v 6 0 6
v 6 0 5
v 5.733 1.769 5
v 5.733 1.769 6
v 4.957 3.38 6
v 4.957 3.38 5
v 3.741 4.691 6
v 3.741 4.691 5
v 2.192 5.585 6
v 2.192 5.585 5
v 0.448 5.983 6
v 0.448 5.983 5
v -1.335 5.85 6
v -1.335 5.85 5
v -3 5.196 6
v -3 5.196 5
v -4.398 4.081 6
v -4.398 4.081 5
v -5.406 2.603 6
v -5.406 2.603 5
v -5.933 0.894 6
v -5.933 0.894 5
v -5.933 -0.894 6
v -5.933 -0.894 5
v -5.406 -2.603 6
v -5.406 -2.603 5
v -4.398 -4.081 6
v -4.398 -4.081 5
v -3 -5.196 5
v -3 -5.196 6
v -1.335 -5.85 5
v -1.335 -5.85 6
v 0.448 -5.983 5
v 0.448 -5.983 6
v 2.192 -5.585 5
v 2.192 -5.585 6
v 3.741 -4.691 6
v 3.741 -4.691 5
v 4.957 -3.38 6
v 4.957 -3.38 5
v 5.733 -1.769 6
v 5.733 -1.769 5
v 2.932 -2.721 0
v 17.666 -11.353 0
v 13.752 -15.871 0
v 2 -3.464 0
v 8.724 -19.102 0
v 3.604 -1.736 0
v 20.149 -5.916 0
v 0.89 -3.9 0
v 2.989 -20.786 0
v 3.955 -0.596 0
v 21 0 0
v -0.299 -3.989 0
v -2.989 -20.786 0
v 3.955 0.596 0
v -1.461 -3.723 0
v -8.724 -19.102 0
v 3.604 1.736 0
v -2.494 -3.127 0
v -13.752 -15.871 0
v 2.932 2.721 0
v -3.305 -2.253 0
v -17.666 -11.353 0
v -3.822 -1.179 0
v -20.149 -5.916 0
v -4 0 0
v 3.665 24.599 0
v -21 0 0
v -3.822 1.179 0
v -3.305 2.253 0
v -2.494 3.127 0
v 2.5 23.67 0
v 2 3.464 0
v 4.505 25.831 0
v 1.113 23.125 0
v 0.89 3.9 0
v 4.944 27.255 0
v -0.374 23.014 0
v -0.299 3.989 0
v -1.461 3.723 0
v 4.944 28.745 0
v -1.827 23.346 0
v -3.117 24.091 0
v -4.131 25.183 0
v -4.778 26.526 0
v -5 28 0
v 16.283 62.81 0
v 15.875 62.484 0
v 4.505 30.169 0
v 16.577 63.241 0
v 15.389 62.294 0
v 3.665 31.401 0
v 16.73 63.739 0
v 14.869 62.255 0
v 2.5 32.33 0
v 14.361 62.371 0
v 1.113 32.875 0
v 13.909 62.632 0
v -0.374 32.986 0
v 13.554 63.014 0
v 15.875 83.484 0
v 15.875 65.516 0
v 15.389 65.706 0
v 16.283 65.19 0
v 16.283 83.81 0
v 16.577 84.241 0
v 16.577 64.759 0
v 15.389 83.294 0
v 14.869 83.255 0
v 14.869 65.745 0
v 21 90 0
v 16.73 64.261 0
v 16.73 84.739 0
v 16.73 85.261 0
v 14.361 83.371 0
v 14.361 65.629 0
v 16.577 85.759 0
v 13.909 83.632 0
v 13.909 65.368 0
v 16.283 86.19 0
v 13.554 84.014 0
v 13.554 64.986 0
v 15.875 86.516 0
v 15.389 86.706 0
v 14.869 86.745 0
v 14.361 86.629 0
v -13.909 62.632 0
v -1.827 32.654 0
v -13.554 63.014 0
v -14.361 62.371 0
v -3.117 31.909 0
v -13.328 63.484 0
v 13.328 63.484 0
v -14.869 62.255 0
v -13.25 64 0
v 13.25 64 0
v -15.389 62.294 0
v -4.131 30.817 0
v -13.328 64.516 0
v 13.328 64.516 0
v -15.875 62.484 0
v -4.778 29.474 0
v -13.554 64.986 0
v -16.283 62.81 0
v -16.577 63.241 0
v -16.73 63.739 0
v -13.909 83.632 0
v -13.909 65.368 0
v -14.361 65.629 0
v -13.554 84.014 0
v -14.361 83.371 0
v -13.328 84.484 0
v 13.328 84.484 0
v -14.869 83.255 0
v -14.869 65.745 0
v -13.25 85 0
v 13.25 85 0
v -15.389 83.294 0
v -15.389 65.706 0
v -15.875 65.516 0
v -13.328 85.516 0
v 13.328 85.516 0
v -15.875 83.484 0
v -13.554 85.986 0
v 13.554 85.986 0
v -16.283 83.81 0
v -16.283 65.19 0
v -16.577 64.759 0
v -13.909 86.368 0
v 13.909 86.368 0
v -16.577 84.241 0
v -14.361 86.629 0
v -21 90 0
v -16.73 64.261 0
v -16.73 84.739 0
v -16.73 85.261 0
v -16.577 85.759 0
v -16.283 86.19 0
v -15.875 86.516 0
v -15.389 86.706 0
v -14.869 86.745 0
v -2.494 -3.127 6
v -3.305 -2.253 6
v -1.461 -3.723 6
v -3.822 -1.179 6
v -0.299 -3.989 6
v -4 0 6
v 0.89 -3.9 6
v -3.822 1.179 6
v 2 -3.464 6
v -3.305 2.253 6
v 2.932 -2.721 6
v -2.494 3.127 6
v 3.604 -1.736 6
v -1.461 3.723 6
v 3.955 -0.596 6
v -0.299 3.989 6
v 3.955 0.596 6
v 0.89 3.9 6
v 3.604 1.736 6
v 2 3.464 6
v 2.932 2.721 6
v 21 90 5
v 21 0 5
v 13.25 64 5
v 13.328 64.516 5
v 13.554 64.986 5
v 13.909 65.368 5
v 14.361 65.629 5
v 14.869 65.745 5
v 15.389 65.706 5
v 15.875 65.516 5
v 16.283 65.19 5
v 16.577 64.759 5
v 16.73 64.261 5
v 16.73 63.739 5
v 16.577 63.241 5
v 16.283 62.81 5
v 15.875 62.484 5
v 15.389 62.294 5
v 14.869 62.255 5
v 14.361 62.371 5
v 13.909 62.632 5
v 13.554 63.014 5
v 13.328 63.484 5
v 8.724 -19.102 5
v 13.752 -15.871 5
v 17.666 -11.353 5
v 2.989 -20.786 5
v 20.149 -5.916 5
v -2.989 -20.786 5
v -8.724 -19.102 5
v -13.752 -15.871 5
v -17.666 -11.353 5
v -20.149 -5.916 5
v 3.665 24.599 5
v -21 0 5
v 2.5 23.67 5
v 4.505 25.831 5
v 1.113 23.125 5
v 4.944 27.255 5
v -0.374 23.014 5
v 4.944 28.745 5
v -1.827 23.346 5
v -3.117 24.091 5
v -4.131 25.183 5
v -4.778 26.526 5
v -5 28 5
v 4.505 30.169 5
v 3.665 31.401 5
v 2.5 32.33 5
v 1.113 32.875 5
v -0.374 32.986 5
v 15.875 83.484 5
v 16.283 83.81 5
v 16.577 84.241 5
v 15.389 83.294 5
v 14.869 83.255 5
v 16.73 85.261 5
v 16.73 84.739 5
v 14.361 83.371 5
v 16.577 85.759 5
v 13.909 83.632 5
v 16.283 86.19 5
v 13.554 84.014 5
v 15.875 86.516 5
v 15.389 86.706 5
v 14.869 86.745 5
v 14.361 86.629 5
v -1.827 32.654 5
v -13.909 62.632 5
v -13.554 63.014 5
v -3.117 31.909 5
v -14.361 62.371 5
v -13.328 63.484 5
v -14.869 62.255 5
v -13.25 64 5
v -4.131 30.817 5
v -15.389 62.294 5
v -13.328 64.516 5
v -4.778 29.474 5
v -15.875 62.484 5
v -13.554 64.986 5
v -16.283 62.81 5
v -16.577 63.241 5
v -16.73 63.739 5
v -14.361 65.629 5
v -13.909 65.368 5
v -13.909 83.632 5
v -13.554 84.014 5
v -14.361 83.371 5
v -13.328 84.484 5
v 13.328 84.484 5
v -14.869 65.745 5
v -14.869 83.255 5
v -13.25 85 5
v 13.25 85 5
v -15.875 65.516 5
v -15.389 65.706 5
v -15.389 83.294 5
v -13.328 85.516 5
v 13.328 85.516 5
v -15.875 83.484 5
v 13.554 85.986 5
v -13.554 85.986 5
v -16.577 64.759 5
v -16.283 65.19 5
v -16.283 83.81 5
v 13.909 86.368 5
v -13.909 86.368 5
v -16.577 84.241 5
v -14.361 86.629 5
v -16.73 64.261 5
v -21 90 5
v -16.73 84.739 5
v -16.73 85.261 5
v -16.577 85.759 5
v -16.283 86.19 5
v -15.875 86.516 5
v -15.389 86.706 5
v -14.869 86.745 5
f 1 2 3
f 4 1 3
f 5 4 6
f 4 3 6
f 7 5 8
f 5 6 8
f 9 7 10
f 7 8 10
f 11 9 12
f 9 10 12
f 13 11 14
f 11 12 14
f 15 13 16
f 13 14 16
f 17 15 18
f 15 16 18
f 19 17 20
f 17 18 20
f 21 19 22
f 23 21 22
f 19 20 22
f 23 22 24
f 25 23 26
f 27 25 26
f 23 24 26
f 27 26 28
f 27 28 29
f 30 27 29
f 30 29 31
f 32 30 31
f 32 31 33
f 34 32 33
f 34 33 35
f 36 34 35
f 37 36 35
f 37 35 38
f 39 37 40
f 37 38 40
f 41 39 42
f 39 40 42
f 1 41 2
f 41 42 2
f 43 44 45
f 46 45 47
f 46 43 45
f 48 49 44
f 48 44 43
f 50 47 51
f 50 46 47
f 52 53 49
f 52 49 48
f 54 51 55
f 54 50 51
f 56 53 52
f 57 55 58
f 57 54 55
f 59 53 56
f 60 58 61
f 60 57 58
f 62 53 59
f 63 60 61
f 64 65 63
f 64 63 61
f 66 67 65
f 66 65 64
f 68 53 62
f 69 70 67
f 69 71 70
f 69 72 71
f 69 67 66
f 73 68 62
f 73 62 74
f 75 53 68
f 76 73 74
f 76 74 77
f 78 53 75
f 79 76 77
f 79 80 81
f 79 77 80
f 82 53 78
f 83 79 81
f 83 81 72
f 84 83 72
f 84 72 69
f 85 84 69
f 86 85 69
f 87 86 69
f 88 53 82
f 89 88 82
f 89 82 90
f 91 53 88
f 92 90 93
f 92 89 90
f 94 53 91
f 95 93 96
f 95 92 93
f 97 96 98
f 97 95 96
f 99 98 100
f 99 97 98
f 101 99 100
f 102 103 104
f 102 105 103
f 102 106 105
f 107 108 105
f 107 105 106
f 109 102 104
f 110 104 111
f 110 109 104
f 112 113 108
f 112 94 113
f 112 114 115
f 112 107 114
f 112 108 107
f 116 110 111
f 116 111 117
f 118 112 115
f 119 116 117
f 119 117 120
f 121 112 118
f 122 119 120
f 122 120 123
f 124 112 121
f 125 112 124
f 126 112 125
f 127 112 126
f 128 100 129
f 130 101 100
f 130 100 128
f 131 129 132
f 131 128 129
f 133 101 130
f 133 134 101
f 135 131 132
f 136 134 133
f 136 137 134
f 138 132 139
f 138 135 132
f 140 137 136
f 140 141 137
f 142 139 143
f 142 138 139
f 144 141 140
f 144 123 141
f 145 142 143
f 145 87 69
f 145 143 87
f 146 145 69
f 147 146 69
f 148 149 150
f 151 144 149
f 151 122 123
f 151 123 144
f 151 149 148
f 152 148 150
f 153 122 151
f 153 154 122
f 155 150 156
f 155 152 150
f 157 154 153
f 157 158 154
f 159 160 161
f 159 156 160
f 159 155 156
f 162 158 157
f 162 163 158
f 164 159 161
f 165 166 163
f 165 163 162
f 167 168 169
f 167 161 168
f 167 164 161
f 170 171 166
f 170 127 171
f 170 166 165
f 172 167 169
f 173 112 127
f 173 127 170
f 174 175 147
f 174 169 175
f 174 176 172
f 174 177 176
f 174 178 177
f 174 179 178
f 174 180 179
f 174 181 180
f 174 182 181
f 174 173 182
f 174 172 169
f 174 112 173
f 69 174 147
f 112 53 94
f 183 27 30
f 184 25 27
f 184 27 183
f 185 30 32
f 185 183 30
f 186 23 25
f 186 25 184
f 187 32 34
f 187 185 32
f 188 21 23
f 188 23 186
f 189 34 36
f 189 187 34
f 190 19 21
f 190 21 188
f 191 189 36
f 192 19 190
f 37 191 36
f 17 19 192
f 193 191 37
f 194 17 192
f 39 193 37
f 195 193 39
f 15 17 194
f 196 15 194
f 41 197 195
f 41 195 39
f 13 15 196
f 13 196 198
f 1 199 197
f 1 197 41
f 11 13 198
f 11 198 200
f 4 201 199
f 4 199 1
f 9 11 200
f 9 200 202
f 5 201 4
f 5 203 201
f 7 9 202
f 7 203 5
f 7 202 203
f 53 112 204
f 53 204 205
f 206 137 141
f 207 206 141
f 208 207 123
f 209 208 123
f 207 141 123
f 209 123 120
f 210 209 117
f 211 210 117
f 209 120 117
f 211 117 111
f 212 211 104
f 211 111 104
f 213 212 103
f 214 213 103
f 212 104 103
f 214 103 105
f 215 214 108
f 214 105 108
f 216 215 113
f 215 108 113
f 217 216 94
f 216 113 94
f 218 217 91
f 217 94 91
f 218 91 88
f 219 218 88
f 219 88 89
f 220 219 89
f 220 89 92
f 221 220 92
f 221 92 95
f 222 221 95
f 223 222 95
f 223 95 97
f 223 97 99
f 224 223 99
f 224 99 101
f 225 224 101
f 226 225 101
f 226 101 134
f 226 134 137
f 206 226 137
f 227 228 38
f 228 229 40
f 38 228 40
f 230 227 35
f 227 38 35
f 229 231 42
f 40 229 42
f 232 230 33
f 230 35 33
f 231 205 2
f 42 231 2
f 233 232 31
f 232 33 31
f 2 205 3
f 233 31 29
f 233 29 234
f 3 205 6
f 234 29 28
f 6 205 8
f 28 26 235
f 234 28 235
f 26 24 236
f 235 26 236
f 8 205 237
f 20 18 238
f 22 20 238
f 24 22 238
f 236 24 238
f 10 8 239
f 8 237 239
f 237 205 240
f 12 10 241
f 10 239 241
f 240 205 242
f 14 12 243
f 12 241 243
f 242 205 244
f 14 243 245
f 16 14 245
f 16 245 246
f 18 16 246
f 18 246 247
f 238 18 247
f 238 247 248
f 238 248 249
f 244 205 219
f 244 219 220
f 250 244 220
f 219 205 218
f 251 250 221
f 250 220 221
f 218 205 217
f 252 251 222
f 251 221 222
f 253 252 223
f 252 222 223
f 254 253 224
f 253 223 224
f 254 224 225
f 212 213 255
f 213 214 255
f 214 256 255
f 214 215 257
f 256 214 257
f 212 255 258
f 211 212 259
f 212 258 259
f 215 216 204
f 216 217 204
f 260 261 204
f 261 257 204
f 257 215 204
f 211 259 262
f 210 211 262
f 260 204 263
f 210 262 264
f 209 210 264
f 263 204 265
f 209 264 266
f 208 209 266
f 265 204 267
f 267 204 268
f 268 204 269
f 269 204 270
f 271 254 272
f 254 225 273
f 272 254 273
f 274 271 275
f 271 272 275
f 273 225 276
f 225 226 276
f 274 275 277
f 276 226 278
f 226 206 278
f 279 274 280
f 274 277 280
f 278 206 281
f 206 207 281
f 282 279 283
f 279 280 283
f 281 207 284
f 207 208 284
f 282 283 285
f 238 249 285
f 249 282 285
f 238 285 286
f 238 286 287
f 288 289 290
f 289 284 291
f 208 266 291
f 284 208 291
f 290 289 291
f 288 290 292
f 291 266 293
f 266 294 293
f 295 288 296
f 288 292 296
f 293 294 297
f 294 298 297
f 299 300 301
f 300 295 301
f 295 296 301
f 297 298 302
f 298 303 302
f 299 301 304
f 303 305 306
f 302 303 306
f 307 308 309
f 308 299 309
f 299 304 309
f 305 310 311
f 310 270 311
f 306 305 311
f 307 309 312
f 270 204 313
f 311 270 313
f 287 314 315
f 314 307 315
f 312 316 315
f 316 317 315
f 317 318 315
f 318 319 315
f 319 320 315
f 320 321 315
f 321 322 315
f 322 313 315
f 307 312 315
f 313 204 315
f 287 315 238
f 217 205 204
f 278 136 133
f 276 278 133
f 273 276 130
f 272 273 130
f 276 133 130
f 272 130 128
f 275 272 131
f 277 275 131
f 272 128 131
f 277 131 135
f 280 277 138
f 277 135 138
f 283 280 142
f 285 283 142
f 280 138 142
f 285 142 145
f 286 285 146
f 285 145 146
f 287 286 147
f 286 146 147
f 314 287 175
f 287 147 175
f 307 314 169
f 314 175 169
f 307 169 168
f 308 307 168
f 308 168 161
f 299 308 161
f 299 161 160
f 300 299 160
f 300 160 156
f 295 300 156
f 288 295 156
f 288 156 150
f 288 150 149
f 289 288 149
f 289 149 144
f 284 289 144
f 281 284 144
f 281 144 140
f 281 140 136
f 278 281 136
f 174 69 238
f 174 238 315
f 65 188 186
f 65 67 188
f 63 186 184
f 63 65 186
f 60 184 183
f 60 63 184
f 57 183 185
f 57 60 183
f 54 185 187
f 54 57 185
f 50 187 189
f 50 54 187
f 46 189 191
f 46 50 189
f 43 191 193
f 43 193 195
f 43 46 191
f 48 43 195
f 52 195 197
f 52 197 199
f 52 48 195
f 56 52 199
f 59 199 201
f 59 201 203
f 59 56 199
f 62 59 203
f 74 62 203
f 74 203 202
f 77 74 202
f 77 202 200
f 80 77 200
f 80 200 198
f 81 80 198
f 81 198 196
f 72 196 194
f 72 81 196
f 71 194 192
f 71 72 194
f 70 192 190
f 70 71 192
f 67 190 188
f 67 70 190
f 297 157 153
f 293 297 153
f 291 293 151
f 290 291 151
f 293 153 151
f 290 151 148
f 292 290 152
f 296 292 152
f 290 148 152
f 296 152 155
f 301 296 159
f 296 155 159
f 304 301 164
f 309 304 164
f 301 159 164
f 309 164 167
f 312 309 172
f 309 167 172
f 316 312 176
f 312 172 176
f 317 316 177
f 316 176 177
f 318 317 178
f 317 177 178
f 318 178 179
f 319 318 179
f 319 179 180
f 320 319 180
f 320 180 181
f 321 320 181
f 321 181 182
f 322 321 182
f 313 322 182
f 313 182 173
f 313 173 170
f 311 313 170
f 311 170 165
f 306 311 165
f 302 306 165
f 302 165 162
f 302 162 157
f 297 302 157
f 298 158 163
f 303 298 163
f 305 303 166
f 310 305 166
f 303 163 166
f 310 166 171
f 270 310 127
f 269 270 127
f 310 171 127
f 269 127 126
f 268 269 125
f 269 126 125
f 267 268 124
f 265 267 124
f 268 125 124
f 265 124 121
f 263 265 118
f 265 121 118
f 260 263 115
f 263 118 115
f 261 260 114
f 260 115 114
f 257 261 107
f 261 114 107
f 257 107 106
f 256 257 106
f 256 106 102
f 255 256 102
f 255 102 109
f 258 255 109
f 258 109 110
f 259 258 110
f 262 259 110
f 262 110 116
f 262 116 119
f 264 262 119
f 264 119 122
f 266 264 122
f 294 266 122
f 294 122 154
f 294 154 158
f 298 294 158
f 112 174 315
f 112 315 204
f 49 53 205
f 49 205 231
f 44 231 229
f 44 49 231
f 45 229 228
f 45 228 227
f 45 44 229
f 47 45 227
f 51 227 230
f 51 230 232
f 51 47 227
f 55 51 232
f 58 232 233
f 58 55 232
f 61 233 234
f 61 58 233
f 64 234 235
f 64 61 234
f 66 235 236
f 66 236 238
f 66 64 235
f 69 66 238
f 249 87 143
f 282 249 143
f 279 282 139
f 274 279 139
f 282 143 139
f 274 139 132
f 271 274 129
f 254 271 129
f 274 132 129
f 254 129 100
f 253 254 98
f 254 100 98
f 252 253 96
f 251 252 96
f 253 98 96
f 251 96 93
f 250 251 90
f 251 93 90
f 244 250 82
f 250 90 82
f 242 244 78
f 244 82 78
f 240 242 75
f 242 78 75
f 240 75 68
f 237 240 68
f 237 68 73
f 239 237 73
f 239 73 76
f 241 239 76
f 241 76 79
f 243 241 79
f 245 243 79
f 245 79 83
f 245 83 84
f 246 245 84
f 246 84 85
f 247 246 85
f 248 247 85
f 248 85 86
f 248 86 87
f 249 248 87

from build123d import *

# Parameters (mm, degrees)
BOSS_EXTRUDE1_DEPTH = 5
SKETCH2_R           = 1.75
CUT_EXTRUDE1_DEPTH  = 93.552687697
SKETCH3_R           = 4
CUT_EXTRUDE2_DEPTH  = 93.552687697
SKETCH4_R           = 5
CUT_EXTRUDE3_DEPTH  = 93.552687697
SKETCH6_R           = 6
SKETCH6_R_2         = 4
BOSS_EXTRUDE3_DEPTH = 1


with BuildPart() as part:
    # Sketch1 → Boss-Extrude1 (new body)
    with BuildSketch(Plane.XY):
        with BuildLine():
            Line((-21, 0), (-21, 90))
            Line((-21, 90), (21, 90))
            Line((21, 90), (21, 0))
            ThreePointArc((21, 0), (0, -21), (-21, 0))
        make_face()
    extrude(amount=BOSS_EXTRUDE1_DEPTH)

    # Sketch2 → Cut-Extrude1 (cut, through all)
    with BuildSketch(Plane(origin=(0, 0, 0), x_dir=(-1, 0, 0), z_dir=(0, 0, -1))):
        with Locations((-15, 85)):
            Circle(SKETCH2_R)
        with Locations((-15, 64)):
            Circle(SKETCH2_R)
        with Locations(Location((15, 64, 0), (0, 0, 180))):
            Circle(SKETCH2_R)
        with Locations(Location((15, 85, 0), (0, 0, 180))):
            Circle(SKETCH2_R)
    extrude(amount=-CUT_EXTRUDE1_DEPTH, mode=Mode.SUBTRACT)

    # Sketch3 → Cut-Extrude2 (cut, through all)
    with BuildSketch(Plane(origin=(0, 0, 0), x_dir=(-1, 0, 0), z_dir=(0, 0, -1))):
        Circle(SKETCH3_R)
    extrude(amount=-CUT_EXTRUDE2_DEPTH, mode=Mode.SUBTRACT)

    # Sketch4 → Cut-Extrude3 (cut, through all)
    with BuildSketch(Plane(origin=(0, 0, 0), x_dir=(-1, 0, 0), z_dir=(0, 0, -1))):
        with Locations((0, 28)):
            Circle(SKETCH4_R)
    extrude(amount=-CUT_EXTRUDE3_DEPTH, mode=Mode.SUBTRACT)

    # Sketch6 → Boss-Extrude3 (add)
    with BuildSketch(Plane.XY.offset(5)):
        Circle(SKETCH6_R)
        with Locations(Location((0, 0, 0), (0, 0, 180))):
            Circle(SKETCH6_R_2, mode=Mode.SUBTRACT)
    extrude(amount=BOSS_EXTRUDE3_DEPTH)


solid = part.part
